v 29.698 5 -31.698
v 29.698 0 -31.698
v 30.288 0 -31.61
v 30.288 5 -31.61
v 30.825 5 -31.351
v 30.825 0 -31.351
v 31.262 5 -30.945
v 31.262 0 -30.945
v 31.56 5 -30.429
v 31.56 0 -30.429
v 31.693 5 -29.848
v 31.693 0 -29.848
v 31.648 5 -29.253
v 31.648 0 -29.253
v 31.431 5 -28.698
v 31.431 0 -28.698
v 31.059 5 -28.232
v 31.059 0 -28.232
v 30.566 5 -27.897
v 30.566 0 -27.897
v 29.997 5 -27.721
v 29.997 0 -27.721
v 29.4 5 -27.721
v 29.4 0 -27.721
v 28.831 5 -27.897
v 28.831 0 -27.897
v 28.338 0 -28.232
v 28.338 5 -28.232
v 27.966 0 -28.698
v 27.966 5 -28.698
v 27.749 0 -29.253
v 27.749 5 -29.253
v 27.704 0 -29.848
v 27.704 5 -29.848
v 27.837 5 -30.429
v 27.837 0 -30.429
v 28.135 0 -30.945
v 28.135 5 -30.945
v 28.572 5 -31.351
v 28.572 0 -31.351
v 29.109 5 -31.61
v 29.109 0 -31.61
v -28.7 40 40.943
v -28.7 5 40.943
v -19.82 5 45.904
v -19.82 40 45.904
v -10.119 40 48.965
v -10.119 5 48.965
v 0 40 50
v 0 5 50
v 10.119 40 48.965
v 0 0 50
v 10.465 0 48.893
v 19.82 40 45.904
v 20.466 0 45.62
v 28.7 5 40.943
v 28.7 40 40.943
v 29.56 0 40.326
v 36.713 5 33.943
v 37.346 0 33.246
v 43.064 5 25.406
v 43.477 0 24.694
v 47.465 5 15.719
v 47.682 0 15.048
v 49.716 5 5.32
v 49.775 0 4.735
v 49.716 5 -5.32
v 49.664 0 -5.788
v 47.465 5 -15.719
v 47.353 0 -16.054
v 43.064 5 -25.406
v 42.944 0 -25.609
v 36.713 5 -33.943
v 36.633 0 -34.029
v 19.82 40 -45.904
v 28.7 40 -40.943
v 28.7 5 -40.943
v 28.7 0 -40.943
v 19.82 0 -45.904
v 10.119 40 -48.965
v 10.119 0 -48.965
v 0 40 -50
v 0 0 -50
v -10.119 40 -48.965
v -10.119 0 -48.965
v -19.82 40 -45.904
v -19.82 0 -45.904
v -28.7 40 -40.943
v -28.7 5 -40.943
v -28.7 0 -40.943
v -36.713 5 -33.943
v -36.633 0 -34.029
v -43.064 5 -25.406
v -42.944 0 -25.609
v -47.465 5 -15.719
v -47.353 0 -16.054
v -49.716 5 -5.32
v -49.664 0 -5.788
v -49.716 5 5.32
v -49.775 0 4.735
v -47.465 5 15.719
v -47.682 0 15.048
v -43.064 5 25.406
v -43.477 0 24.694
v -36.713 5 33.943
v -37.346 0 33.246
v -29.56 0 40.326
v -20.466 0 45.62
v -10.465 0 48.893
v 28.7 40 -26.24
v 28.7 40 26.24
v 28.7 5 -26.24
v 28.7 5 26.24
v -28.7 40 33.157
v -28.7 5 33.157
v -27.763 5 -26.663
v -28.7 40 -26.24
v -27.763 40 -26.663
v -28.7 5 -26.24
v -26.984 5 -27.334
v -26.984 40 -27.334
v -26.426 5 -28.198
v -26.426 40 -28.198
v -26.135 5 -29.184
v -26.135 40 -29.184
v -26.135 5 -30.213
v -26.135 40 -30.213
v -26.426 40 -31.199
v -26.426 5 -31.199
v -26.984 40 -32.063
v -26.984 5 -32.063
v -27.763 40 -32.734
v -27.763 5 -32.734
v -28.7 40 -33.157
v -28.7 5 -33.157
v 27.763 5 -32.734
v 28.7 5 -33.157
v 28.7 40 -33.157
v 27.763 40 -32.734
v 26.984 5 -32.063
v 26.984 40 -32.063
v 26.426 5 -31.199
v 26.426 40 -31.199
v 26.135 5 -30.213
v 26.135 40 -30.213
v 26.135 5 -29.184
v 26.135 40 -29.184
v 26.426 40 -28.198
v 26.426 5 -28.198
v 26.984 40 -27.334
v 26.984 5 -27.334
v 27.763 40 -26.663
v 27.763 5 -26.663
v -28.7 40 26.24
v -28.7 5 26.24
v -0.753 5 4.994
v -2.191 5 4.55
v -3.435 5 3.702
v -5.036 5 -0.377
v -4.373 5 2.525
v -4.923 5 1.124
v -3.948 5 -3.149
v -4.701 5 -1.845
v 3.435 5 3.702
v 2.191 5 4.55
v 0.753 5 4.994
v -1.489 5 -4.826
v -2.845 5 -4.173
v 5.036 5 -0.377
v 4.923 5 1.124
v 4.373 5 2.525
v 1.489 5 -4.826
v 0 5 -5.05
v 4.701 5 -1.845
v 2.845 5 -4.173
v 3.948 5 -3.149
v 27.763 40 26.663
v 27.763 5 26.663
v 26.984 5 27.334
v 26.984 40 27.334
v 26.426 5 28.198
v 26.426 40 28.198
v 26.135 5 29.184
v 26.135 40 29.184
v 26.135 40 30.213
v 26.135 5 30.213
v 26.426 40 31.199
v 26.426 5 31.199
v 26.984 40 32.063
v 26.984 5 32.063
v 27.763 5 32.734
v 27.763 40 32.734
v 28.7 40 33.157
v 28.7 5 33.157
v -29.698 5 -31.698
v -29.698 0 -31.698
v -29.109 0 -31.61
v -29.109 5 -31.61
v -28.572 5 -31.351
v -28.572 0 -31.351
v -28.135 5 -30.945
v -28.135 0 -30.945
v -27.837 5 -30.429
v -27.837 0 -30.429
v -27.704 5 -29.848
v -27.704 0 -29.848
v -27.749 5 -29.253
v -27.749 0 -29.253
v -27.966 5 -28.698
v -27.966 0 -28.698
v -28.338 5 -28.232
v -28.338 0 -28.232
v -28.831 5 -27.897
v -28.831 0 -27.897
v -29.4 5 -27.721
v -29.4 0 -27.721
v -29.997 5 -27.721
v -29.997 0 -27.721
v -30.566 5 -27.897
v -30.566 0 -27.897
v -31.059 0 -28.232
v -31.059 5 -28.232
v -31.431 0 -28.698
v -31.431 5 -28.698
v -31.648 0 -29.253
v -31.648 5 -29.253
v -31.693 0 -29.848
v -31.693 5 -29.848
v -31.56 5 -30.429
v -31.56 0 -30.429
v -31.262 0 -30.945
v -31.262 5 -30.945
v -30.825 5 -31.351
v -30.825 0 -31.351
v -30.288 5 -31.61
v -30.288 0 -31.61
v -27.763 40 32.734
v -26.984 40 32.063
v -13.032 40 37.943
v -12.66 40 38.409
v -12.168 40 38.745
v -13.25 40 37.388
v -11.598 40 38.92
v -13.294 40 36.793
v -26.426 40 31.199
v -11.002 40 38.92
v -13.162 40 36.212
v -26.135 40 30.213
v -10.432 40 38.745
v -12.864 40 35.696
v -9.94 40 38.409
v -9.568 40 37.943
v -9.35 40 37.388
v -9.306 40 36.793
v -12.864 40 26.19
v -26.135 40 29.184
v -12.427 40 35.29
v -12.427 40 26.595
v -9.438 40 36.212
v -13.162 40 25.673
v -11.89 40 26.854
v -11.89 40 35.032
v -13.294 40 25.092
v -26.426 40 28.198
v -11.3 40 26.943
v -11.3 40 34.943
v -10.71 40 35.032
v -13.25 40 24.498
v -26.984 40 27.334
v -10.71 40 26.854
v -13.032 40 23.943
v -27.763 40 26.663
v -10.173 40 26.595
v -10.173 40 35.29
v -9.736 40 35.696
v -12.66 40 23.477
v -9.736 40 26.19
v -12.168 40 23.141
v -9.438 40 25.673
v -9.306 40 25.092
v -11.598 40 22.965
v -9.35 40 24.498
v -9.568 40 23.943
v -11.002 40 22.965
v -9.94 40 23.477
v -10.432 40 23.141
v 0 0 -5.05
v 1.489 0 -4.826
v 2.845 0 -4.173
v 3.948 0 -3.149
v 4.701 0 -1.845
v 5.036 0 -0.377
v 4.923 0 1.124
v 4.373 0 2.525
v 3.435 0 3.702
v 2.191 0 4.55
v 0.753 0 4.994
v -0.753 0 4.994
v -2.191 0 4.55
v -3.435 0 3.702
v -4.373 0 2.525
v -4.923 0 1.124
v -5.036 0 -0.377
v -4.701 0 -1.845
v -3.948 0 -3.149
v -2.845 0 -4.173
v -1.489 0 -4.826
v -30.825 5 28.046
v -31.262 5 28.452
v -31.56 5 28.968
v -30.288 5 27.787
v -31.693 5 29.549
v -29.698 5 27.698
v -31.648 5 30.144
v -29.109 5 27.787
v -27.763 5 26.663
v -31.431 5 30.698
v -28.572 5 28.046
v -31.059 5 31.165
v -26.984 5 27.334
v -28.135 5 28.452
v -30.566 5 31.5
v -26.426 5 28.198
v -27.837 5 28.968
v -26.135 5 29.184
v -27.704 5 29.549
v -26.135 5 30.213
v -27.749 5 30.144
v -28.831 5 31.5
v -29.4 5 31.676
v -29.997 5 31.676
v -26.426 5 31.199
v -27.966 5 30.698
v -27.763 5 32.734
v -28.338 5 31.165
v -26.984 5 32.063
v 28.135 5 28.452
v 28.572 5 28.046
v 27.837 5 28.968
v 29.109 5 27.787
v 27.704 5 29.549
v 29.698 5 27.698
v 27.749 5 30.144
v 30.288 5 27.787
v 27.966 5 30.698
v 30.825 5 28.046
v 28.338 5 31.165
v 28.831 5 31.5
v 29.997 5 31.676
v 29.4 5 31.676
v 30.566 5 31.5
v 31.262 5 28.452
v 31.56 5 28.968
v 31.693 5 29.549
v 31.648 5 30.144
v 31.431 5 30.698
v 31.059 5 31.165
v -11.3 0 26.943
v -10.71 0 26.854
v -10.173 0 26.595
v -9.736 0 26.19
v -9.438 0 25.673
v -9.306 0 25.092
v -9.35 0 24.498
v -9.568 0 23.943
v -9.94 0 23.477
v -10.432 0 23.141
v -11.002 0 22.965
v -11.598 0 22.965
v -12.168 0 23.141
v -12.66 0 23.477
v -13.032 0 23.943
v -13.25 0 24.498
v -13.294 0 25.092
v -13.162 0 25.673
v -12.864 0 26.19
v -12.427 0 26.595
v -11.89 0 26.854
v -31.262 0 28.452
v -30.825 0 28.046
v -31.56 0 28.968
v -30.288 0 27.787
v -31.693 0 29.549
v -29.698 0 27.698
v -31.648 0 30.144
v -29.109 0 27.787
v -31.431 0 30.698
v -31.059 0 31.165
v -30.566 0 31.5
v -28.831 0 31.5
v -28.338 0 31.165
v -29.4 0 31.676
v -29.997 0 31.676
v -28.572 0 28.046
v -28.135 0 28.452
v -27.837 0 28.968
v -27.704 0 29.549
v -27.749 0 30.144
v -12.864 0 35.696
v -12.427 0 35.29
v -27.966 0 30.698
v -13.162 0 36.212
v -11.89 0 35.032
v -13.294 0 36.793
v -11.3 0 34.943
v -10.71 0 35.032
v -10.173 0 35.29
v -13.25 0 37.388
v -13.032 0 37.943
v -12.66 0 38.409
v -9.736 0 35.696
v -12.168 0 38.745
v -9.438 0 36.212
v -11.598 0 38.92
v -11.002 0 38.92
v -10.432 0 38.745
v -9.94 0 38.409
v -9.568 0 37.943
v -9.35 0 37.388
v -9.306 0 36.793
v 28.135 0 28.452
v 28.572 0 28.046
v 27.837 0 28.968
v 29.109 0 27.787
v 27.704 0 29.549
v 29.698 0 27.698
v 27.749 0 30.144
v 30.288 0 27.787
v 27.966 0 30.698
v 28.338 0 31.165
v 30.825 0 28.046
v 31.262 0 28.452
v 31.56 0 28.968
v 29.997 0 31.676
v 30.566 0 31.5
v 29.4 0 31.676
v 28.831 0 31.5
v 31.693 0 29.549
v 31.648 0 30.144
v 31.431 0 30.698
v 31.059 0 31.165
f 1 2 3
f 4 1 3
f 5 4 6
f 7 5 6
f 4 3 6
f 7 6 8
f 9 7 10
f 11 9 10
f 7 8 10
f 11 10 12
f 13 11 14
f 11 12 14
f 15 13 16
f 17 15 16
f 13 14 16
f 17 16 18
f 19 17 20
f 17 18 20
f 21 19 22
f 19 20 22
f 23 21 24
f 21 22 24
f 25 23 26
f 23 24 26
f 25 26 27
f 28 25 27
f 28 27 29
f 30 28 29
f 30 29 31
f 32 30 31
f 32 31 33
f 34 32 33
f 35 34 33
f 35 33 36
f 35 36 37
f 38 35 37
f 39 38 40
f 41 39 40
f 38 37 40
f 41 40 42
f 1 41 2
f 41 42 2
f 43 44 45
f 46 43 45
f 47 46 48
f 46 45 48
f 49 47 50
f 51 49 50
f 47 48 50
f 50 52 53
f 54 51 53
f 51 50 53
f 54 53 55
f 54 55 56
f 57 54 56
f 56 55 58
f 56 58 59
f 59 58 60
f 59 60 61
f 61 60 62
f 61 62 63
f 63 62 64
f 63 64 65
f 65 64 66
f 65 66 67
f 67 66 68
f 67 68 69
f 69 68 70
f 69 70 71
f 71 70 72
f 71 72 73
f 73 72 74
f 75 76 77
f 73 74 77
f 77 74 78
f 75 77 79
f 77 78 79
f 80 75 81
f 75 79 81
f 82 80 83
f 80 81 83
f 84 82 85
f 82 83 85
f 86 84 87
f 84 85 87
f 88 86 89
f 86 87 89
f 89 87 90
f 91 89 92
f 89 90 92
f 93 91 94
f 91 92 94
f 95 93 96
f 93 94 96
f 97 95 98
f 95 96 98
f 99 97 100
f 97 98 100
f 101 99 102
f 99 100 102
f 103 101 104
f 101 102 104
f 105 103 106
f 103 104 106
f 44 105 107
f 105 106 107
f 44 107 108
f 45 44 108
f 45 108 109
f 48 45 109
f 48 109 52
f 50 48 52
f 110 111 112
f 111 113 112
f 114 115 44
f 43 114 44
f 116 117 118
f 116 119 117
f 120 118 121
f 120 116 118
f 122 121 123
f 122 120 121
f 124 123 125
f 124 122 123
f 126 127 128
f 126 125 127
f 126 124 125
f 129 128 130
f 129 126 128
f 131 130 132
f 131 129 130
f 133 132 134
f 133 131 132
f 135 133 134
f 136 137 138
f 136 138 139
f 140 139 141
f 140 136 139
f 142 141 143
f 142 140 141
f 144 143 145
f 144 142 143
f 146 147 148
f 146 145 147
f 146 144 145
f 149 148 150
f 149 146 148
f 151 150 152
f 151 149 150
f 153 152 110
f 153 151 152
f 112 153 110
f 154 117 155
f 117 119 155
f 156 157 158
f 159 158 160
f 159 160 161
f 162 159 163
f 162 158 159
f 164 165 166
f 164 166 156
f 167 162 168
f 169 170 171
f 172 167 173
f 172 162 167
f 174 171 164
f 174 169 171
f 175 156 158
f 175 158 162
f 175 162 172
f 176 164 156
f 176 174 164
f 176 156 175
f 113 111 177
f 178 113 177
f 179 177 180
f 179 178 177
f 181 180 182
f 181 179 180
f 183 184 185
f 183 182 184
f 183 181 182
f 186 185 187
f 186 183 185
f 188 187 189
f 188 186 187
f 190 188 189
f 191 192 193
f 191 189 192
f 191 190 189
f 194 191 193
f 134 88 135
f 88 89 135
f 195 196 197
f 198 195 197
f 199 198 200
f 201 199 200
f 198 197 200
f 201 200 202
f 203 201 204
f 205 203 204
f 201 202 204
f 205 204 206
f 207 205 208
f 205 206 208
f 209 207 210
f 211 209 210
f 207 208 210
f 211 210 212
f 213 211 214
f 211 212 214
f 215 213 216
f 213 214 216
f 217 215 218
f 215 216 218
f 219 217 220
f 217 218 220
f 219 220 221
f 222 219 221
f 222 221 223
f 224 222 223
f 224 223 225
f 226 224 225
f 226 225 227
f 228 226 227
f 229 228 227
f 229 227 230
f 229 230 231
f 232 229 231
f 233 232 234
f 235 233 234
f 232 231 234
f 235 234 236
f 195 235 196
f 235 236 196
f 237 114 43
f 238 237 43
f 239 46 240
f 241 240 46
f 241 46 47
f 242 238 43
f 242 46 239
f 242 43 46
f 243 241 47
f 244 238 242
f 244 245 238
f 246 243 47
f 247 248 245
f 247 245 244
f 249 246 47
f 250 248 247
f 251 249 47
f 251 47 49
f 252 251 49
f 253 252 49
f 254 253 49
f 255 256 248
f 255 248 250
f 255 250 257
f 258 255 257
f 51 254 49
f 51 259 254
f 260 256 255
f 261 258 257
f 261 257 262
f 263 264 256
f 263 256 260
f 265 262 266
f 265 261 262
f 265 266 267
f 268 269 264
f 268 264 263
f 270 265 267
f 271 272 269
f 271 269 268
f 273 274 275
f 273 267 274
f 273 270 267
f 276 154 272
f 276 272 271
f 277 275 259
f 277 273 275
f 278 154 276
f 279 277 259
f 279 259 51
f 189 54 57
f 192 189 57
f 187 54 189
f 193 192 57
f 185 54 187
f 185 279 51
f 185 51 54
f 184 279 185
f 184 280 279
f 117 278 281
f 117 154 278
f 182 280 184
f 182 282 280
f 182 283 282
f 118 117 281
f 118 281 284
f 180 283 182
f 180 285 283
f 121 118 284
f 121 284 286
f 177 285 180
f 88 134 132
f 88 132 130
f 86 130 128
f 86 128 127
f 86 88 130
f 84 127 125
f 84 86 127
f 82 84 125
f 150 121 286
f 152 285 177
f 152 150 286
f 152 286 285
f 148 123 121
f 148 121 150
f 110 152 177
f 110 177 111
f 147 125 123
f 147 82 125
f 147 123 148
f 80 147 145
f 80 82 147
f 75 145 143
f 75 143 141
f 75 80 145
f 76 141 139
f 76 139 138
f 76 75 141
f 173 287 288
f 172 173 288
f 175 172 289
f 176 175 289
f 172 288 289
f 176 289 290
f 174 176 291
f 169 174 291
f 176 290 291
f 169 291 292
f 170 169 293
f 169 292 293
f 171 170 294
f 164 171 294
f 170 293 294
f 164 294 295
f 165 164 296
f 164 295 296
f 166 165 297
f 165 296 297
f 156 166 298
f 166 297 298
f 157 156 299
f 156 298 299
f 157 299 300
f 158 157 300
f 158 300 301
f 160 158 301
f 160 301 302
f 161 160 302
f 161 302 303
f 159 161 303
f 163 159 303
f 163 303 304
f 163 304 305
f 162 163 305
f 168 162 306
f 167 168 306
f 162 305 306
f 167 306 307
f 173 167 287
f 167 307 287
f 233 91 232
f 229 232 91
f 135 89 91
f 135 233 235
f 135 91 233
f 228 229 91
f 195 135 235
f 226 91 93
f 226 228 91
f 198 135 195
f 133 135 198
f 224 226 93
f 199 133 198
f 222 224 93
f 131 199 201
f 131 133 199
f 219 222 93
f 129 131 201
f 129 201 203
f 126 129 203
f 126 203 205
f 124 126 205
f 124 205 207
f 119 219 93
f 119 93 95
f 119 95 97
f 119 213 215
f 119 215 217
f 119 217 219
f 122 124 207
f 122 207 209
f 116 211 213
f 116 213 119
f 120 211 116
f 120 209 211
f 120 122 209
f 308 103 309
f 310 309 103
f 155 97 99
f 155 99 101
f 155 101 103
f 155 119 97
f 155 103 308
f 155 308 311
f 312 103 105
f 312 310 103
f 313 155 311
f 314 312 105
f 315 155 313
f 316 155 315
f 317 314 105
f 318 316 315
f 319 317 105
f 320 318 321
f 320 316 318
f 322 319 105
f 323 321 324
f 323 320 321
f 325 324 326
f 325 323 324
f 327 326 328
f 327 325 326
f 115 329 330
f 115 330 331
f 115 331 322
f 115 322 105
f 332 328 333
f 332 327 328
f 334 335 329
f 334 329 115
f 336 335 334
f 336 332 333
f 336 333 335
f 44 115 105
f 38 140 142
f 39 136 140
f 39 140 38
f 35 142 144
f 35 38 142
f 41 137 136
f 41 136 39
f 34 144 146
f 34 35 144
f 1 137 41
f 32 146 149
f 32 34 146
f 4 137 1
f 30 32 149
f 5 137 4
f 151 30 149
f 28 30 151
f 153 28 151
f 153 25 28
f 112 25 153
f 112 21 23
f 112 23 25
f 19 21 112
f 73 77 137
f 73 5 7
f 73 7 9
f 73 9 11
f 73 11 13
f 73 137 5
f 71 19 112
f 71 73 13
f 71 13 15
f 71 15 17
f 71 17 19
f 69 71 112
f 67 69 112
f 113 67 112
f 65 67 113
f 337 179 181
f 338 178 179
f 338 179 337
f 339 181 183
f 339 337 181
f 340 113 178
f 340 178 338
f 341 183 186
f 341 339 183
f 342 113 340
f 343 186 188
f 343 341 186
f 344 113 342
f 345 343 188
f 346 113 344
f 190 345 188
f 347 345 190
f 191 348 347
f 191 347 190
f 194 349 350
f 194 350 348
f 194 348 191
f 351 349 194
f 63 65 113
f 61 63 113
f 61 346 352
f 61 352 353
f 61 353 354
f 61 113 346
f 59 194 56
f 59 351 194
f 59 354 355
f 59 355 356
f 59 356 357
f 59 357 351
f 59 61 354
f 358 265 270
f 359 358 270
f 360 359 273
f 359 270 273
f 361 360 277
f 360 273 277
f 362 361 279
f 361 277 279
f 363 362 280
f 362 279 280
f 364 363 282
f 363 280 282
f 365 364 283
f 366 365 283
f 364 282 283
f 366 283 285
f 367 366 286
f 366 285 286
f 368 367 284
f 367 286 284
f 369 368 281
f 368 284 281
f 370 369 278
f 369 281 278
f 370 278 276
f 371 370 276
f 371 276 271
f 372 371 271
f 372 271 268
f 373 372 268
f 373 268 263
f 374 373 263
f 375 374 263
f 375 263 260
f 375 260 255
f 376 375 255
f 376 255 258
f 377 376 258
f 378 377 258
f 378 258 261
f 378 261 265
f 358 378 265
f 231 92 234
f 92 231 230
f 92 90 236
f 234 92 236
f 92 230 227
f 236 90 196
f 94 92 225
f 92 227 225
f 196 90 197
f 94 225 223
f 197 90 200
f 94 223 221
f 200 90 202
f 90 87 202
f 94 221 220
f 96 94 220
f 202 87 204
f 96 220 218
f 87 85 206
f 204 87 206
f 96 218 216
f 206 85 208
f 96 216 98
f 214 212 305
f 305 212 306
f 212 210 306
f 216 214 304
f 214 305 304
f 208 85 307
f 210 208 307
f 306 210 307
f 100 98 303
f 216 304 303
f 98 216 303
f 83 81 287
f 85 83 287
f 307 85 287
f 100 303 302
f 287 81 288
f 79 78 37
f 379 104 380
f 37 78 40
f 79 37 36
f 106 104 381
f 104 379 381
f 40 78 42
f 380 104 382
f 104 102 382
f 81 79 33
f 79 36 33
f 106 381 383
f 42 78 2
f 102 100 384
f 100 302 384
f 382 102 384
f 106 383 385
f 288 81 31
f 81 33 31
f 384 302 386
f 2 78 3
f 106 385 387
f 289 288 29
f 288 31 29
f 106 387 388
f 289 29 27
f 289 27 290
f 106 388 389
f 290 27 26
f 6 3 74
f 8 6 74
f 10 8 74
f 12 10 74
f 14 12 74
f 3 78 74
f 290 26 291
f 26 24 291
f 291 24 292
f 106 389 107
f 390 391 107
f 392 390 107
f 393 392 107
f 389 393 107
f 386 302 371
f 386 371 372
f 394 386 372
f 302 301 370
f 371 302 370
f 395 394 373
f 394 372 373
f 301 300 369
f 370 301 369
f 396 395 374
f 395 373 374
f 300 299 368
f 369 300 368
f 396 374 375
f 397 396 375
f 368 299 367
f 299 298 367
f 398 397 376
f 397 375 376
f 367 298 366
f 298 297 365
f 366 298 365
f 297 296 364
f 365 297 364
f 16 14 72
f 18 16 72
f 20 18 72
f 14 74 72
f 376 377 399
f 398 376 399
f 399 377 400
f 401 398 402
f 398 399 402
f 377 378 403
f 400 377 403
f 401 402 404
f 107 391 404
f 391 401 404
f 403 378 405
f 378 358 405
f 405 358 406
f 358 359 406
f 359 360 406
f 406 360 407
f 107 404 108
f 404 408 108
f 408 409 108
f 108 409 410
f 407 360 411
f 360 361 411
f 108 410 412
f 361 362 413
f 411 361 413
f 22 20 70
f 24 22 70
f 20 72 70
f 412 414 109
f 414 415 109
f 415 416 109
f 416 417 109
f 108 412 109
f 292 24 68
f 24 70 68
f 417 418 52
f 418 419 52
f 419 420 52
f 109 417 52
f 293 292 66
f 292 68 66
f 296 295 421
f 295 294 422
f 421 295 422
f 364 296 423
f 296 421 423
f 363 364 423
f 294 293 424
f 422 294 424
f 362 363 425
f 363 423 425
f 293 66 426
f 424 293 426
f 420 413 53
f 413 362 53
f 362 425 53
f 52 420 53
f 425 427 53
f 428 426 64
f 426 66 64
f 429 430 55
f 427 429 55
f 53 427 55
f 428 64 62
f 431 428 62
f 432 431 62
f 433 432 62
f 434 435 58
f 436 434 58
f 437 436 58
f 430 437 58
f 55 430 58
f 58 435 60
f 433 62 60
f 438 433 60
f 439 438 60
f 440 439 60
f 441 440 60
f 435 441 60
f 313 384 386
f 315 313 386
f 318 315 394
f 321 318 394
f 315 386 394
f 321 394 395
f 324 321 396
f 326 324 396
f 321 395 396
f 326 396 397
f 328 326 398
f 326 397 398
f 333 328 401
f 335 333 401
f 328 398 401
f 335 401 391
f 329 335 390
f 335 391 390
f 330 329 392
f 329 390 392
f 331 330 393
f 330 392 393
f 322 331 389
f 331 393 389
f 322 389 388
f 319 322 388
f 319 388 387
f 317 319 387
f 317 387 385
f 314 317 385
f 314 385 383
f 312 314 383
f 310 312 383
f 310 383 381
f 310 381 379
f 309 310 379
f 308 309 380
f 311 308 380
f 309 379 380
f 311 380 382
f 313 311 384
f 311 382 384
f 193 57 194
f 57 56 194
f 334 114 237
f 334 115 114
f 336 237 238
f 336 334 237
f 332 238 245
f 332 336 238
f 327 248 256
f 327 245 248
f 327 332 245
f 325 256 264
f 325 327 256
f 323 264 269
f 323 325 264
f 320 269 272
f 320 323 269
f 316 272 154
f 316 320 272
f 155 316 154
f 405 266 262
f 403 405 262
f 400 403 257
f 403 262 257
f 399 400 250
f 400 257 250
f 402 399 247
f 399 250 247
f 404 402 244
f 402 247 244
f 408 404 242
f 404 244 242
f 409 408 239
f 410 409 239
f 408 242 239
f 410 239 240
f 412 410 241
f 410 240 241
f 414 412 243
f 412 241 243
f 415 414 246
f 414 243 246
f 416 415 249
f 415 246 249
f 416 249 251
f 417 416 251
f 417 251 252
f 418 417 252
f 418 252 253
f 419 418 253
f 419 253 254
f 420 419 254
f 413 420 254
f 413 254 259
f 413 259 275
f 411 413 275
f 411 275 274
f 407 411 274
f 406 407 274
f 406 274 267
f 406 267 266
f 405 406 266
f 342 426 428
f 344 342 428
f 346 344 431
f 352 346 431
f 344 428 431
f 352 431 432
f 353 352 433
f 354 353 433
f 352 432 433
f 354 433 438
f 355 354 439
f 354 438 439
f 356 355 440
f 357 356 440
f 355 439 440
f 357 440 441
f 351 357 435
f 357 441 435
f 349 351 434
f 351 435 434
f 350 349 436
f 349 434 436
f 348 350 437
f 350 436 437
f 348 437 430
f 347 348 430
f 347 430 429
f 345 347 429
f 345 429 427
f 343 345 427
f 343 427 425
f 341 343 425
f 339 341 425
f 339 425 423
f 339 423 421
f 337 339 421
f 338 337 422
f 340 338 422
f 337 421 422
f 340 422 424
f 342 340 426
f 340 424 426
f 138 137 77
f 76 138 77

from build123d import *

# Parameters (mm, degrees)
ARA_D_ZLEM_R                = 50
BASE_DEPTH                  = 5
Y_KSEKLIK_EKSTR_ZYON2_DEPTH = 40
IZIM2_R                     = 2
BANANA_SLOTLAR_DEPTH        = 82.240384046
IZIM3_R                     = 2
IZIM3_R_2                   = 5.05
KES_EKSTR_ZYON1_DEPTH       = 5
IZIM3_2_R                   = 2
KES_EKSTR_ZYON2_DEPTH       = 82.240384046
IZIM5_R                     = 3.6
KES_EKSTR_ZYON3_DEPTH       = 79.89866919


with BuildPart() as part:
    # ara düzlem → base (new body)
    with BuildSketch(Plane(origin=(0, 0, 0), x_dir=(1, 0, 0), z_dir=(0, 1, 0))):
        Circle(ARA_D_ZLEM_R)
    extrude(amount=BASE_DEPTH)

    # Çizim1<3> → Yükseklik-Ekstrüzyon2 (add)
    with BuildSketch(Plane(origin=(0, 0, 0), x_dir=(1, 0, 0), z_dir=(0, 1, 0))):
        with BuildLine():
            ThreePointArc((28.7, 40.942764929), (0, 50), (-28.7, 40.942764929))
            Line((-28.7, 40.942764929), (-28.7, -40.942764929))
            ThreePointArc((-28.7, -40.942764929), (0, -50), (28.7, -40.942764929))
            Line((28.7, -40.942764929), (28.7, 40.942764929))
        make_face()
    extrude(amount=Y_KSEKLIK_EKSTR_ZYON2_DEPTH)

    # Çizim2 → banana slotlar (cut, through all)
    with BuildSketch(Plane(origin=(0, 40, 0), x_dir=(1, 0, 0), z_dir=(0, 1, 0))):
        with Locations((-11.3, -24.942764929)):
            Circle(IZIM2_R)
        with Locations((-11.3, -36.942764929)):
            Circle(IZIM2_R)
    extrude(amount=-BANANA_SLOTLAR_DEPTH, mode=Mode.SUBTRACT)

    # Çizim3 → Kes-Ekstrüzyon1 (cut)
    with BuildSketch(Plane.XZ):
        with Locations((-29.69848481, 29.69848481)):
            Circle(IZIM3_R)
        with Locations((29.69848481, 29.69848481)):
            Circle(IZIM3_R)
        with Locations((29.69848481, -29.69848481)):
            Circle(IZIM3_R)
        with Locations((-29.69848481, -29.69848481)):
            Circle(IZIM3_R)
        Circle(IZIM3_R_2)
    extrude(amount=-KES_EKSTR_ZYON1_DEPTH, mode=Mode.SUBTRACT)

    # Çizim3<2> → Kes-Ekstrüzyon2 (cut, through all)
    with BuildSketch(Plane.XZ):
        with Locations((-29.69848481, 29.69848481)):
            Circle(IZIM3_2_R)
        with Locations((29.69848481, 29.69848481)):
            Circle(IZIM3_2_R)
        with Locations((29.69848481, -29.69848481)):
            Circle(IZIM3_2_R)
        with Locations((-29.69848481, -29.69848481)):
            Circle(IZIM3_2_R)
    extrude(amount=-KES_EKSTR_ZYON2_DEPTH, mode=Mode.SUBTRACT)

    # Çizim5 → Kes-Ekstrüzyon3 (cut, through all)
    with BuildSketch(Plane(origin=(0, 5, 0), x_dir=(1, 0, 0), z_dir=(0, 1, 0))):
        with Locations((29.69848481, -29.69848481)):
            Circle(IZIM5_R)
        with Locations((-29.69848481, -29.69848481)):
            Circle(IZIM5_R)
        with Locations((-29.69848481, 29.69848481)):
            Circle(IZIM5_R)
        with Locations((29.69848481, 29.69848481)):
            Circle(IZIM5_R)
    extrude(amount=KES_EKSTR_ZYON3_DEPTH, mode=Mode.SUBTRACT)


solid = part.part
